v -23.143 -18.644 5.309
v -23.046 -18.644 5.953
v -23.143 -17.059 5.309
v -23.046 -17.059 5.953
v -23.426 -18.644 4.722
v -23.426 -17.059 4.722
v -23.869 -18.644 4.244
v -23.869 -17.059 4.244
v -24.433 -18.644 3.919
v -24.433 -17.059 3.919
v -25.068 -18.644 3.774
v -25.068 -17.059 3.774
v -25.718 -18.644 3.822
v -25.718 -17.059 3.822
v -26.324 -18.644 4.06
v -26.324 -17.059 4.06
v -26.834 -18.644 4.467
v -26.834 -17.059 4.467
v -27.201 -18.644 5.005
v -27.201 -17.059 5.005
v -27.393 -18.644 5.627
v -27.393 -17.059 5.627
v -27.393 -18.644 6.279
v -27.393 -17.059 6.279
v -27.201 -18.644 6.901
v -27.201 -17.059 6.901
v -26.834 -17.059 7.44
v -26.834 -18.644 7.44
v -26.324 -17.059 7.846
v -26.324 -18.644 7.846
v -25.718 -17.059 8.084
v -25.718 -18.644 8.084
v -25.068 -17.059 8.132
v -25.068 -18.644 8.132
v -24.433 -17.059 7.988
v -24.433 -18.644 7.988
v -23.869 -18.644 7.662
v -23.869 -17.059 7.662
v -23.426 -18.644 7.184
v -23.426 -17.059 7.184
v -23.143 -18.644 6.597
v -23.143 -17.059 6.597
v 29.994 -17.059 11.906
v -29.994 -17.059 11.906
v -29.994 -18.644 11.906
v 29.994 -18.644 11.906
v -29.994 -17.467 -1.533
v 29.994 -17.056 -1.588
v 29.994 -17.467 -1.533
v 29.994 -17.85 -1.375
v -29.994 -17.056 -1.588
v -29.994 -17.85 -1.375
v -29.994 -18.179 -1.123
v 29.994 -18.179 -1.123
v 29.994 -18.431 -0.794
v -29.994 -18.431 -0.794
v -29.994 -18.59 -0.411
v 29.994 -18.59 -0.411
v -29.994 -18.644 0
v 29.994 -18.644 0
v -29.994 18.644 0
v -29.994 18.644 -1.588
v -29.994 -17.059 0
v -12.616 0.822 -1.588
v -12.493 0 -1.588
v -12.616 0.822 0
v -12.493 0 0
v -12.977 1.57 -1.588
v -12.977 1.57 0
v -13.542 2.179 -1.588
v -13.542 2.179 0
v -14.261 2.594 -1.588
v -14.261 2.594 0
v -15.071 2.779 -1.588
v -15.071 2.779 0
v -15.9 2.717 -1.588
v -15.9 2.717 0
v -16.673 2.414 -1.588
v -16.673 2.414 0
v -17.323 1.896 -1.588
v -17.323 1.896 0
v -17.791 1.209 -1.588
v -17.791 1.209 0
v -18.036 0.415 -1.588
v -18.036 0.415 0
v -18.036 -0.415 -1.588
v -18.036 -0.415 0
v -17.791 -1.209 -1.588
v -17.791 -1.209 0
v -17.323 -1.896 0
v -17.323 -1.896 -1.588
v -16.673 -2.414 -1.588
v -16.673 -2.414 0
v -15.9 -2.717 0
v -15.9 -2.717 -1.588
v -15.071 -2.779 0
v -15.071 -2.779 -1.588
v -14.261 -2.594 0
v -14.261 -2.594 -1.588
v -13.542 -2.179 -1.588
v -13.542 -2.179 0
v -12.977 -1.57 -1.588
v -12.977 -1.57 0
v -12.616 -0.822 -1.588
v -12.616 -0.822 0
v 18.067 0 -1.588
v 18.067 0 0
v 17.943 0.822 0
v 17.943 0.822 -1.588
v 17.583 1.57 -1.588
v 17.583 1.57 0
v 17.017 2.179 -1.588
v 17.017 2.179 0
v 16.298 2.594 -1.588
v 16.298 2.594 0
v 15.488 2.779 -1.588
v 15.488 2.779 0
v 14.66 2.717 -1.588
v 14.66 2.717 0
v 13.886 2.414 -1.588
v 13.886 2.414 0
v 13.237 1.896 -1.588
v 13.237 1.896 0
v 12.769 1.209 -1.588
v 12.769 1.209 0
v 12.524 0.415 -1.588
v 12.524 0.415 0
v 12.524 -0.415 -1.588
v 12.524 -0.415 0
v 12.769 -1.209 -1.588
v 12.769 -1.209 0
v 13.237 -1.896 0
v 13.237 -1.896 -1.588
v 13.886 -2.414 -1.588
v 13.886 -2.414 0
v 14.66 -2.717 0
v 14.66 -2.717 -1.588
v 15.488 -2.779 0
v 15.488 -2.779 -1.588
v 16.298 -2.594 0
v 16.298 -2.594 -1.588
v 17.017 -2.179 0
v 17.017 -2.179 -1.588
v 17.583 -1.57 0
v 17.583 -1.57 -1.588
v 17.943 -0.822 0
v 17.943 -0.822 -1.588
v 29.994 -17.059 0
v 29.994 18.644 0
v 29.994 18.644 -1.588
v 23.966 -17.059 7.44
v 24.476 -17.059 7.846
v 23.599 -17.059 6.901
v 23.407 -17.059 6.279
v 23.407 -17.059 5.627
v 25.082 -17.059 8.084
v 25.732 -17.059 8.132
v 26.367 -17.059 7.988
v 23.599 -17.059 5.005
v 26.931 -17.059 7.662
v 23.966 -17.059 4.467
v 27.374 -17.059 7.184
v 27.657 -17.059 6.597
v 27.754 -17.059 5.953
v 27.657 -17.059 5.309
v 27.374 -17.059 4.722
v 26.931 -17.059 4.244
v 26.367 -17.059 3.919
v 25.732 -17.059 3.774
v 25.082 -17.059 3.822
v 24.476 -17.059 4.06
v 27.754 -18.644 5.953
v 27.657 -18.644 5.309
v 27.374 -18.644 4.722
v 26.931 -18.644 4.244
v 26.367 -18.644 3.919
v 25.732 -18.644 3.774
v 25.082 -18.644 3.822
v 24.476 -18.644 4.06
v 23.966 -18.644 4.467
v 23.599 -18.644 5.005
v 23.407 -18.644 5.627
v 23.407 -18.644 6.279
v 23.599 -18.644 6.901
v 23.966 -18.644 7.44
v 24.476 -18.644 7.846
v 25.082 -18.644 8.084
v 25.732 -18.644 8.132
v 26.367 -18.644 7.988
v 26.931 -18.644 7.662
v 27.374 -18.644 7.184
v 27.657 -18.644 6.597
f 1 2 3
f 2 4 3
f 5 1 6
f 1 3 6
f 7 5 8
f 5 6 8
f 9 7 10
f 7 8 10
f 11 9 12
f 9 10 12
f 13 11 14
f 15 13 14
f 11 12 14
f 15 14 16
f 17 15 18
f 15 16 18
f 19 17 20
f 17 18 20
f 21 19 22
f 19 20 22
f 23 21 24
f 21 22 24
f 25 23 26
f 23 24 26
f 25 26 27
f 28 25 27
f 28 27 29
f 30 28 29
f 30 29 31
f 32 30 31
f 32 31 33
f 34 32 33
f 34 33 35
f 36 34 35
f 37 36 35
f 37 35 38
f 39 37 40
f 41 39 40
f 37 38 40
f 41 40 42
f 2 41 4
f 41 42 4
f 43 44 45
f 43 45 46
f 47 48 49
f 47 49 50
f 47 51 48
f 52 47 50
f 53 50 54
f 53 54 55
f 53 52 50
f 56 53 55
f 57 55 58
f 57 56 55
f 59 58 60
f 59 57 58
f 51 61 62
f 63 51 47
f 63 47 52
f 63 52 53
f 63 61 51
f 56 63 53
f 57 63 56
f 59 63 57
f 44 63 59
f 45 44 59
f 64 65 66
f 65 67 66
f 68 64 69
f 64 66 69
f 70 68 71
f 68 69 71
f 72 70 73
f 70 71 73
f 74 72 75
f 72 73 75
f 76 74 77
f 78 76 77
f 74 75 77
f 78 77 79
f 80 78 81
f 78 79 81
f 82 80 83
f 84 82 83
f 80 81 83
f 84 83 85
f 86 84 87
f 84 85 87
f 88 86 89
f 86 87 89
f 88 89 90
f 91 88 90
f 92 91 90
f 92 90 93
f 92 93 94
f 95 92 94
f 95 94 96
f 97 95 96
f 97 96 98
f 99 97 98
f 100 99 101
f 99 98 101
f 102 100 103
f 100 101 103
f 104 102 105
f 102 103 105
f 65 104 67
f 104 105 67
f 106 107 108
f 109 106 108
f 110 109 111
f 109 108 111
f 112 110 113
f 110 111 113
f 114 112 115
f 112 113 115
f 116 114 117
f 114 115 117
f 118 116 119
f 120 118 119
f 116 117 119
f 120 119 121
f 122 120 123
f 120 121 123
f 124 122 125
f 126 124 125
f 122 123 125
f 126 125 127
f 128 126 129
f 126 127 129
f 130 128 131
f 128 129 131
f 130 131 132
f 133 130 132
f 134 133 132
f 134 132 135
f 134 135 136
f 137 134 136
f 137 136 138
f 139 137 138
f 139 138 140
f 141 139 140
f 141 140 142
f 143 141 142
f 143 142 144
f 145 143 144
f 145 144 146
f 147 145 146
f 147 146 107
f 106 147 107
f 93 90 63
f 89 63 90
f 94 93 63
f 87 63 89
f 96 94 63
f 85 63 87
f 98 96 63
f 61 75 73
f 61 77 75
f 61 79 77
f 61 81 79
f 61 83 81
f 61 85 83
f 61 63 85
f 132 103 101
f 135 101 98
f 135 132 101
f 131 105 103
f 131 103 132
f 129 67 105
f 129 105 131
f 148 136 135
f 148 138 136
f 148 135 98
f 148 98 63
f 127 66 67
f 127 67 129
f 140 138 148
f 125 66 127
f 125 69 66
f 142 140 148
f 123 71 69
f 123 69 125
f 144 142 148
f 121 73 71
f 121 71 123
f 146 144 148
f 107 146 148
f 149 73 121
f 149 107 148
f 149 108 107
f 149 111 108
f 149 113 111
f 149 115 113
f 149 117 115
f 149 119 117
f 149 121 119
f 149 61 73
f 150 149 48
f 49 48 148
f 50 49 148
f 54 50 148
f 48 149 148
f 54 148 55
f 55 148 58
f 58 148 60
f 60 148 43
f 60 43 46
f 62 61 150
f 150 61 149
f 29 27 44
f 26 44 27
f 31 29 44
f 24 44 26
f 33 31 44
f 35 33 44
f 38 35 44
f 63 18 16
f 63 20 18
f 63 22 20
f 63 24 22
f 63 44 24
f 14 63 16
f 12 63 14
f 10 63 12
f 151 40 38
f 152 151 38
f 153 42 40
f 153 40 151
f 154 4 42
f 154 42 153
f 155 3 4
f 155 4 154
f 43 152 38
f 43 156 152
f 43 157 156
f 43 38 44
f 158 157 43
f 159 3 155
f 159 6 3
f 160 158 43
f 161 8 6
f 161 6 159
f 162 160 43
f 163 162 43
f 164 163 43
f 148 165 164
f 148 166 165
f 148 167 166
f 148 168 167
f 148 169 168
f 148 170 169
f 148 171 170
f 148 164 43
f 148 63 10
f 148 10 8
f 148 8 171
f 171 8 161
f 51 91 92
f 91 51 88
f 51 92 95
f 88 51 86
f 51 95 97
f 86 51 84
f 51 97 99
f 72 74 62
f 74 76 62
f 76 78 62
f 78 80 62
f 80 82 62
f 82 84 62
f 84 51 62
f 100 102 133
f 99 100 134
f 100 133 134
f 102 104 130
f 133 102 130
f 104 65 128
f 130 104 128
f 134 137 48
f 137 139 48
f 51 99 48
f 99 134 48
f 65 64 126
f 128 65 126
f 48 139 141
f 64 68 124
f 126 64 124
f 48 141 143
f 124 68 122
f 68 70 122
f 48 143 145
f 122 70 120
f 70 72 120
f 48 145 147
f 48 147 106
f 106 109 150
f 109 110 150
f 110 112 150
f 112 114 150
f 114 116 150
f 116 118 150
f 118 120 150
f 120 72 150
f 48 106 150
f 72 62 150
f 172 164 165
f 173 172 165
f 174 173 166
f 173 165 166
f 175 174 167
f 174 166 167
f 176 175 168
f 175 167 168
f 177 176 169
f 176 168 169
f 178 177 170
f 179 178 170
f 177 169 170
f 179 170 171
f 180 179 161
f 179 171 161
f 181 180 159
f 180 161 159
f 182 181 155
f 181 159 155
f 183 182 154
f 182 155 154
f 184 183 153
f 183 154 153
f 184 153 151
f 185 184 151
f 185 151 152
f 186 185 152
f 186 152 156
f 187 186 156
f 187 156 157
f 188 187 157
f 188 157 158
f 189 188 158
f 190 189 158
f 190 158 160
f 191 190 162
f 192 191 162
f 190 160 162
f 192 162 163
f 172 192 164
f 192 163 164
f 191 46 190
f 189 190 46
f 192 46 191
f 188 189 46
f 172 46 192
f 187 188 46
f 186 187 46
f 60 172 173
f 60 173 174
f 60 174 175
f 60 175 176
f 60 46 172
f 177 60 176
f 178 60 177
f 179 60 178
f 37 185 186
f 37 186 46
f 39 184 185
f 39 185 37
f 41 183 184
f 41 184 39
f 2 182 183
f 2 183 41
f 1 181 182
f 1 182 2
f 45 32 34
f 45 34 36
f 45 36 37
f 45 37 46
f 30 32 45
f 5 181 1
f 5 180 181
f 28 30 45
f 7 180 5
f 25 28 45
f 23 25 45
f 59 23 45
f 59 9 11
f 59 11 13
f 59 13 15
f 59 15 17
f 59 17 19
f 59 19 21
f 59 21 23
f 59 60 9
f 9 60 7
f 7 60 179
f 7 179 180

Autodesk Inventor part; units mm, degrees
ref_plane "YZ Plane" through (0, 0, 0) normal (1, 0, 0) x (0, 1, 0)
ref_plane "XZ Plane" through (0, 0, 0) normal (0, 1, 0) x (-1, 0, 0)
ref_plane "XY Plane" through (0, 0, 0) normal (0, 0, 1) x (1, 0, 0)
sketch "Sketch1" plane through (0, 0, 0) normal (0, 0, 1) x (1, 0, 0)
  line L0 (29.994, -18.6437) -> (-29.994, -18.6437)
  line L1 (-29.994, 18.6437) -> (29.994, 18.6437)
  line L2 (29.994, -18.6437) -> (-29.994, 18.6437) construction
  line L3 (-29.994, -18.6437) -> (29.994, 18.6437) construction
  line L4 (29.994, -18.6437) -> (-29.994, -18.6437)
  line L5 (-29.994, -18.6437) -> (-29.994, -17.0588)
  line L6 (-29.994, -17.0588) -> (29.994, -17.0588)
  line L7 (29.994, -17.0588) -> (29.994, -18.6437)
  line L8 (-29.994, 18.6437) -> (-29.994, -17.0588)
  line L9 (29.994, 18.6437) -> (29.994, -17.0588)
  point P0 (0, 0)
extrude "Extrusion1" add sketch "Sketch1" against normal blind 1.5875 contours L6 L8 L1 L9
extrude "Extrusion2" add sketch "Sketch1" along normal blind 11.9062 and the other way blind 1.5875 contours L0 L5 L6 L7
sketch "Sketch2" plane through (-29.994, -17.0588, 0) normal (0, 1, 0) x (1, 0, 0)
  circle A0 centre (4.7625, -5.9531) radius 2.1855
  circle A1 centre (55.5625, -5.9531) radius 2.1855
  point P0 (29.994, 0)
  point P1 (0, 0)
sketch "Sketch3" plane through (0, 0, 0) normal (0, 0, 1) x (1, 0, 0)
  circle A0 centre (-15.2797, 0) radius 2.7871
  circle A1 centre (15.2797, 0) radius 2.7871
extrude "Extrusion3" cut sketch "Sketch3" against normal blind 25.4
extrude "Extrusion4" cut sketch "Sketch2" against normal blind 25.4
fillet "Fillet1" radius 1.5875 1 edges at (0, -18.6437, -1.5875)
properties part number "balun_support"
